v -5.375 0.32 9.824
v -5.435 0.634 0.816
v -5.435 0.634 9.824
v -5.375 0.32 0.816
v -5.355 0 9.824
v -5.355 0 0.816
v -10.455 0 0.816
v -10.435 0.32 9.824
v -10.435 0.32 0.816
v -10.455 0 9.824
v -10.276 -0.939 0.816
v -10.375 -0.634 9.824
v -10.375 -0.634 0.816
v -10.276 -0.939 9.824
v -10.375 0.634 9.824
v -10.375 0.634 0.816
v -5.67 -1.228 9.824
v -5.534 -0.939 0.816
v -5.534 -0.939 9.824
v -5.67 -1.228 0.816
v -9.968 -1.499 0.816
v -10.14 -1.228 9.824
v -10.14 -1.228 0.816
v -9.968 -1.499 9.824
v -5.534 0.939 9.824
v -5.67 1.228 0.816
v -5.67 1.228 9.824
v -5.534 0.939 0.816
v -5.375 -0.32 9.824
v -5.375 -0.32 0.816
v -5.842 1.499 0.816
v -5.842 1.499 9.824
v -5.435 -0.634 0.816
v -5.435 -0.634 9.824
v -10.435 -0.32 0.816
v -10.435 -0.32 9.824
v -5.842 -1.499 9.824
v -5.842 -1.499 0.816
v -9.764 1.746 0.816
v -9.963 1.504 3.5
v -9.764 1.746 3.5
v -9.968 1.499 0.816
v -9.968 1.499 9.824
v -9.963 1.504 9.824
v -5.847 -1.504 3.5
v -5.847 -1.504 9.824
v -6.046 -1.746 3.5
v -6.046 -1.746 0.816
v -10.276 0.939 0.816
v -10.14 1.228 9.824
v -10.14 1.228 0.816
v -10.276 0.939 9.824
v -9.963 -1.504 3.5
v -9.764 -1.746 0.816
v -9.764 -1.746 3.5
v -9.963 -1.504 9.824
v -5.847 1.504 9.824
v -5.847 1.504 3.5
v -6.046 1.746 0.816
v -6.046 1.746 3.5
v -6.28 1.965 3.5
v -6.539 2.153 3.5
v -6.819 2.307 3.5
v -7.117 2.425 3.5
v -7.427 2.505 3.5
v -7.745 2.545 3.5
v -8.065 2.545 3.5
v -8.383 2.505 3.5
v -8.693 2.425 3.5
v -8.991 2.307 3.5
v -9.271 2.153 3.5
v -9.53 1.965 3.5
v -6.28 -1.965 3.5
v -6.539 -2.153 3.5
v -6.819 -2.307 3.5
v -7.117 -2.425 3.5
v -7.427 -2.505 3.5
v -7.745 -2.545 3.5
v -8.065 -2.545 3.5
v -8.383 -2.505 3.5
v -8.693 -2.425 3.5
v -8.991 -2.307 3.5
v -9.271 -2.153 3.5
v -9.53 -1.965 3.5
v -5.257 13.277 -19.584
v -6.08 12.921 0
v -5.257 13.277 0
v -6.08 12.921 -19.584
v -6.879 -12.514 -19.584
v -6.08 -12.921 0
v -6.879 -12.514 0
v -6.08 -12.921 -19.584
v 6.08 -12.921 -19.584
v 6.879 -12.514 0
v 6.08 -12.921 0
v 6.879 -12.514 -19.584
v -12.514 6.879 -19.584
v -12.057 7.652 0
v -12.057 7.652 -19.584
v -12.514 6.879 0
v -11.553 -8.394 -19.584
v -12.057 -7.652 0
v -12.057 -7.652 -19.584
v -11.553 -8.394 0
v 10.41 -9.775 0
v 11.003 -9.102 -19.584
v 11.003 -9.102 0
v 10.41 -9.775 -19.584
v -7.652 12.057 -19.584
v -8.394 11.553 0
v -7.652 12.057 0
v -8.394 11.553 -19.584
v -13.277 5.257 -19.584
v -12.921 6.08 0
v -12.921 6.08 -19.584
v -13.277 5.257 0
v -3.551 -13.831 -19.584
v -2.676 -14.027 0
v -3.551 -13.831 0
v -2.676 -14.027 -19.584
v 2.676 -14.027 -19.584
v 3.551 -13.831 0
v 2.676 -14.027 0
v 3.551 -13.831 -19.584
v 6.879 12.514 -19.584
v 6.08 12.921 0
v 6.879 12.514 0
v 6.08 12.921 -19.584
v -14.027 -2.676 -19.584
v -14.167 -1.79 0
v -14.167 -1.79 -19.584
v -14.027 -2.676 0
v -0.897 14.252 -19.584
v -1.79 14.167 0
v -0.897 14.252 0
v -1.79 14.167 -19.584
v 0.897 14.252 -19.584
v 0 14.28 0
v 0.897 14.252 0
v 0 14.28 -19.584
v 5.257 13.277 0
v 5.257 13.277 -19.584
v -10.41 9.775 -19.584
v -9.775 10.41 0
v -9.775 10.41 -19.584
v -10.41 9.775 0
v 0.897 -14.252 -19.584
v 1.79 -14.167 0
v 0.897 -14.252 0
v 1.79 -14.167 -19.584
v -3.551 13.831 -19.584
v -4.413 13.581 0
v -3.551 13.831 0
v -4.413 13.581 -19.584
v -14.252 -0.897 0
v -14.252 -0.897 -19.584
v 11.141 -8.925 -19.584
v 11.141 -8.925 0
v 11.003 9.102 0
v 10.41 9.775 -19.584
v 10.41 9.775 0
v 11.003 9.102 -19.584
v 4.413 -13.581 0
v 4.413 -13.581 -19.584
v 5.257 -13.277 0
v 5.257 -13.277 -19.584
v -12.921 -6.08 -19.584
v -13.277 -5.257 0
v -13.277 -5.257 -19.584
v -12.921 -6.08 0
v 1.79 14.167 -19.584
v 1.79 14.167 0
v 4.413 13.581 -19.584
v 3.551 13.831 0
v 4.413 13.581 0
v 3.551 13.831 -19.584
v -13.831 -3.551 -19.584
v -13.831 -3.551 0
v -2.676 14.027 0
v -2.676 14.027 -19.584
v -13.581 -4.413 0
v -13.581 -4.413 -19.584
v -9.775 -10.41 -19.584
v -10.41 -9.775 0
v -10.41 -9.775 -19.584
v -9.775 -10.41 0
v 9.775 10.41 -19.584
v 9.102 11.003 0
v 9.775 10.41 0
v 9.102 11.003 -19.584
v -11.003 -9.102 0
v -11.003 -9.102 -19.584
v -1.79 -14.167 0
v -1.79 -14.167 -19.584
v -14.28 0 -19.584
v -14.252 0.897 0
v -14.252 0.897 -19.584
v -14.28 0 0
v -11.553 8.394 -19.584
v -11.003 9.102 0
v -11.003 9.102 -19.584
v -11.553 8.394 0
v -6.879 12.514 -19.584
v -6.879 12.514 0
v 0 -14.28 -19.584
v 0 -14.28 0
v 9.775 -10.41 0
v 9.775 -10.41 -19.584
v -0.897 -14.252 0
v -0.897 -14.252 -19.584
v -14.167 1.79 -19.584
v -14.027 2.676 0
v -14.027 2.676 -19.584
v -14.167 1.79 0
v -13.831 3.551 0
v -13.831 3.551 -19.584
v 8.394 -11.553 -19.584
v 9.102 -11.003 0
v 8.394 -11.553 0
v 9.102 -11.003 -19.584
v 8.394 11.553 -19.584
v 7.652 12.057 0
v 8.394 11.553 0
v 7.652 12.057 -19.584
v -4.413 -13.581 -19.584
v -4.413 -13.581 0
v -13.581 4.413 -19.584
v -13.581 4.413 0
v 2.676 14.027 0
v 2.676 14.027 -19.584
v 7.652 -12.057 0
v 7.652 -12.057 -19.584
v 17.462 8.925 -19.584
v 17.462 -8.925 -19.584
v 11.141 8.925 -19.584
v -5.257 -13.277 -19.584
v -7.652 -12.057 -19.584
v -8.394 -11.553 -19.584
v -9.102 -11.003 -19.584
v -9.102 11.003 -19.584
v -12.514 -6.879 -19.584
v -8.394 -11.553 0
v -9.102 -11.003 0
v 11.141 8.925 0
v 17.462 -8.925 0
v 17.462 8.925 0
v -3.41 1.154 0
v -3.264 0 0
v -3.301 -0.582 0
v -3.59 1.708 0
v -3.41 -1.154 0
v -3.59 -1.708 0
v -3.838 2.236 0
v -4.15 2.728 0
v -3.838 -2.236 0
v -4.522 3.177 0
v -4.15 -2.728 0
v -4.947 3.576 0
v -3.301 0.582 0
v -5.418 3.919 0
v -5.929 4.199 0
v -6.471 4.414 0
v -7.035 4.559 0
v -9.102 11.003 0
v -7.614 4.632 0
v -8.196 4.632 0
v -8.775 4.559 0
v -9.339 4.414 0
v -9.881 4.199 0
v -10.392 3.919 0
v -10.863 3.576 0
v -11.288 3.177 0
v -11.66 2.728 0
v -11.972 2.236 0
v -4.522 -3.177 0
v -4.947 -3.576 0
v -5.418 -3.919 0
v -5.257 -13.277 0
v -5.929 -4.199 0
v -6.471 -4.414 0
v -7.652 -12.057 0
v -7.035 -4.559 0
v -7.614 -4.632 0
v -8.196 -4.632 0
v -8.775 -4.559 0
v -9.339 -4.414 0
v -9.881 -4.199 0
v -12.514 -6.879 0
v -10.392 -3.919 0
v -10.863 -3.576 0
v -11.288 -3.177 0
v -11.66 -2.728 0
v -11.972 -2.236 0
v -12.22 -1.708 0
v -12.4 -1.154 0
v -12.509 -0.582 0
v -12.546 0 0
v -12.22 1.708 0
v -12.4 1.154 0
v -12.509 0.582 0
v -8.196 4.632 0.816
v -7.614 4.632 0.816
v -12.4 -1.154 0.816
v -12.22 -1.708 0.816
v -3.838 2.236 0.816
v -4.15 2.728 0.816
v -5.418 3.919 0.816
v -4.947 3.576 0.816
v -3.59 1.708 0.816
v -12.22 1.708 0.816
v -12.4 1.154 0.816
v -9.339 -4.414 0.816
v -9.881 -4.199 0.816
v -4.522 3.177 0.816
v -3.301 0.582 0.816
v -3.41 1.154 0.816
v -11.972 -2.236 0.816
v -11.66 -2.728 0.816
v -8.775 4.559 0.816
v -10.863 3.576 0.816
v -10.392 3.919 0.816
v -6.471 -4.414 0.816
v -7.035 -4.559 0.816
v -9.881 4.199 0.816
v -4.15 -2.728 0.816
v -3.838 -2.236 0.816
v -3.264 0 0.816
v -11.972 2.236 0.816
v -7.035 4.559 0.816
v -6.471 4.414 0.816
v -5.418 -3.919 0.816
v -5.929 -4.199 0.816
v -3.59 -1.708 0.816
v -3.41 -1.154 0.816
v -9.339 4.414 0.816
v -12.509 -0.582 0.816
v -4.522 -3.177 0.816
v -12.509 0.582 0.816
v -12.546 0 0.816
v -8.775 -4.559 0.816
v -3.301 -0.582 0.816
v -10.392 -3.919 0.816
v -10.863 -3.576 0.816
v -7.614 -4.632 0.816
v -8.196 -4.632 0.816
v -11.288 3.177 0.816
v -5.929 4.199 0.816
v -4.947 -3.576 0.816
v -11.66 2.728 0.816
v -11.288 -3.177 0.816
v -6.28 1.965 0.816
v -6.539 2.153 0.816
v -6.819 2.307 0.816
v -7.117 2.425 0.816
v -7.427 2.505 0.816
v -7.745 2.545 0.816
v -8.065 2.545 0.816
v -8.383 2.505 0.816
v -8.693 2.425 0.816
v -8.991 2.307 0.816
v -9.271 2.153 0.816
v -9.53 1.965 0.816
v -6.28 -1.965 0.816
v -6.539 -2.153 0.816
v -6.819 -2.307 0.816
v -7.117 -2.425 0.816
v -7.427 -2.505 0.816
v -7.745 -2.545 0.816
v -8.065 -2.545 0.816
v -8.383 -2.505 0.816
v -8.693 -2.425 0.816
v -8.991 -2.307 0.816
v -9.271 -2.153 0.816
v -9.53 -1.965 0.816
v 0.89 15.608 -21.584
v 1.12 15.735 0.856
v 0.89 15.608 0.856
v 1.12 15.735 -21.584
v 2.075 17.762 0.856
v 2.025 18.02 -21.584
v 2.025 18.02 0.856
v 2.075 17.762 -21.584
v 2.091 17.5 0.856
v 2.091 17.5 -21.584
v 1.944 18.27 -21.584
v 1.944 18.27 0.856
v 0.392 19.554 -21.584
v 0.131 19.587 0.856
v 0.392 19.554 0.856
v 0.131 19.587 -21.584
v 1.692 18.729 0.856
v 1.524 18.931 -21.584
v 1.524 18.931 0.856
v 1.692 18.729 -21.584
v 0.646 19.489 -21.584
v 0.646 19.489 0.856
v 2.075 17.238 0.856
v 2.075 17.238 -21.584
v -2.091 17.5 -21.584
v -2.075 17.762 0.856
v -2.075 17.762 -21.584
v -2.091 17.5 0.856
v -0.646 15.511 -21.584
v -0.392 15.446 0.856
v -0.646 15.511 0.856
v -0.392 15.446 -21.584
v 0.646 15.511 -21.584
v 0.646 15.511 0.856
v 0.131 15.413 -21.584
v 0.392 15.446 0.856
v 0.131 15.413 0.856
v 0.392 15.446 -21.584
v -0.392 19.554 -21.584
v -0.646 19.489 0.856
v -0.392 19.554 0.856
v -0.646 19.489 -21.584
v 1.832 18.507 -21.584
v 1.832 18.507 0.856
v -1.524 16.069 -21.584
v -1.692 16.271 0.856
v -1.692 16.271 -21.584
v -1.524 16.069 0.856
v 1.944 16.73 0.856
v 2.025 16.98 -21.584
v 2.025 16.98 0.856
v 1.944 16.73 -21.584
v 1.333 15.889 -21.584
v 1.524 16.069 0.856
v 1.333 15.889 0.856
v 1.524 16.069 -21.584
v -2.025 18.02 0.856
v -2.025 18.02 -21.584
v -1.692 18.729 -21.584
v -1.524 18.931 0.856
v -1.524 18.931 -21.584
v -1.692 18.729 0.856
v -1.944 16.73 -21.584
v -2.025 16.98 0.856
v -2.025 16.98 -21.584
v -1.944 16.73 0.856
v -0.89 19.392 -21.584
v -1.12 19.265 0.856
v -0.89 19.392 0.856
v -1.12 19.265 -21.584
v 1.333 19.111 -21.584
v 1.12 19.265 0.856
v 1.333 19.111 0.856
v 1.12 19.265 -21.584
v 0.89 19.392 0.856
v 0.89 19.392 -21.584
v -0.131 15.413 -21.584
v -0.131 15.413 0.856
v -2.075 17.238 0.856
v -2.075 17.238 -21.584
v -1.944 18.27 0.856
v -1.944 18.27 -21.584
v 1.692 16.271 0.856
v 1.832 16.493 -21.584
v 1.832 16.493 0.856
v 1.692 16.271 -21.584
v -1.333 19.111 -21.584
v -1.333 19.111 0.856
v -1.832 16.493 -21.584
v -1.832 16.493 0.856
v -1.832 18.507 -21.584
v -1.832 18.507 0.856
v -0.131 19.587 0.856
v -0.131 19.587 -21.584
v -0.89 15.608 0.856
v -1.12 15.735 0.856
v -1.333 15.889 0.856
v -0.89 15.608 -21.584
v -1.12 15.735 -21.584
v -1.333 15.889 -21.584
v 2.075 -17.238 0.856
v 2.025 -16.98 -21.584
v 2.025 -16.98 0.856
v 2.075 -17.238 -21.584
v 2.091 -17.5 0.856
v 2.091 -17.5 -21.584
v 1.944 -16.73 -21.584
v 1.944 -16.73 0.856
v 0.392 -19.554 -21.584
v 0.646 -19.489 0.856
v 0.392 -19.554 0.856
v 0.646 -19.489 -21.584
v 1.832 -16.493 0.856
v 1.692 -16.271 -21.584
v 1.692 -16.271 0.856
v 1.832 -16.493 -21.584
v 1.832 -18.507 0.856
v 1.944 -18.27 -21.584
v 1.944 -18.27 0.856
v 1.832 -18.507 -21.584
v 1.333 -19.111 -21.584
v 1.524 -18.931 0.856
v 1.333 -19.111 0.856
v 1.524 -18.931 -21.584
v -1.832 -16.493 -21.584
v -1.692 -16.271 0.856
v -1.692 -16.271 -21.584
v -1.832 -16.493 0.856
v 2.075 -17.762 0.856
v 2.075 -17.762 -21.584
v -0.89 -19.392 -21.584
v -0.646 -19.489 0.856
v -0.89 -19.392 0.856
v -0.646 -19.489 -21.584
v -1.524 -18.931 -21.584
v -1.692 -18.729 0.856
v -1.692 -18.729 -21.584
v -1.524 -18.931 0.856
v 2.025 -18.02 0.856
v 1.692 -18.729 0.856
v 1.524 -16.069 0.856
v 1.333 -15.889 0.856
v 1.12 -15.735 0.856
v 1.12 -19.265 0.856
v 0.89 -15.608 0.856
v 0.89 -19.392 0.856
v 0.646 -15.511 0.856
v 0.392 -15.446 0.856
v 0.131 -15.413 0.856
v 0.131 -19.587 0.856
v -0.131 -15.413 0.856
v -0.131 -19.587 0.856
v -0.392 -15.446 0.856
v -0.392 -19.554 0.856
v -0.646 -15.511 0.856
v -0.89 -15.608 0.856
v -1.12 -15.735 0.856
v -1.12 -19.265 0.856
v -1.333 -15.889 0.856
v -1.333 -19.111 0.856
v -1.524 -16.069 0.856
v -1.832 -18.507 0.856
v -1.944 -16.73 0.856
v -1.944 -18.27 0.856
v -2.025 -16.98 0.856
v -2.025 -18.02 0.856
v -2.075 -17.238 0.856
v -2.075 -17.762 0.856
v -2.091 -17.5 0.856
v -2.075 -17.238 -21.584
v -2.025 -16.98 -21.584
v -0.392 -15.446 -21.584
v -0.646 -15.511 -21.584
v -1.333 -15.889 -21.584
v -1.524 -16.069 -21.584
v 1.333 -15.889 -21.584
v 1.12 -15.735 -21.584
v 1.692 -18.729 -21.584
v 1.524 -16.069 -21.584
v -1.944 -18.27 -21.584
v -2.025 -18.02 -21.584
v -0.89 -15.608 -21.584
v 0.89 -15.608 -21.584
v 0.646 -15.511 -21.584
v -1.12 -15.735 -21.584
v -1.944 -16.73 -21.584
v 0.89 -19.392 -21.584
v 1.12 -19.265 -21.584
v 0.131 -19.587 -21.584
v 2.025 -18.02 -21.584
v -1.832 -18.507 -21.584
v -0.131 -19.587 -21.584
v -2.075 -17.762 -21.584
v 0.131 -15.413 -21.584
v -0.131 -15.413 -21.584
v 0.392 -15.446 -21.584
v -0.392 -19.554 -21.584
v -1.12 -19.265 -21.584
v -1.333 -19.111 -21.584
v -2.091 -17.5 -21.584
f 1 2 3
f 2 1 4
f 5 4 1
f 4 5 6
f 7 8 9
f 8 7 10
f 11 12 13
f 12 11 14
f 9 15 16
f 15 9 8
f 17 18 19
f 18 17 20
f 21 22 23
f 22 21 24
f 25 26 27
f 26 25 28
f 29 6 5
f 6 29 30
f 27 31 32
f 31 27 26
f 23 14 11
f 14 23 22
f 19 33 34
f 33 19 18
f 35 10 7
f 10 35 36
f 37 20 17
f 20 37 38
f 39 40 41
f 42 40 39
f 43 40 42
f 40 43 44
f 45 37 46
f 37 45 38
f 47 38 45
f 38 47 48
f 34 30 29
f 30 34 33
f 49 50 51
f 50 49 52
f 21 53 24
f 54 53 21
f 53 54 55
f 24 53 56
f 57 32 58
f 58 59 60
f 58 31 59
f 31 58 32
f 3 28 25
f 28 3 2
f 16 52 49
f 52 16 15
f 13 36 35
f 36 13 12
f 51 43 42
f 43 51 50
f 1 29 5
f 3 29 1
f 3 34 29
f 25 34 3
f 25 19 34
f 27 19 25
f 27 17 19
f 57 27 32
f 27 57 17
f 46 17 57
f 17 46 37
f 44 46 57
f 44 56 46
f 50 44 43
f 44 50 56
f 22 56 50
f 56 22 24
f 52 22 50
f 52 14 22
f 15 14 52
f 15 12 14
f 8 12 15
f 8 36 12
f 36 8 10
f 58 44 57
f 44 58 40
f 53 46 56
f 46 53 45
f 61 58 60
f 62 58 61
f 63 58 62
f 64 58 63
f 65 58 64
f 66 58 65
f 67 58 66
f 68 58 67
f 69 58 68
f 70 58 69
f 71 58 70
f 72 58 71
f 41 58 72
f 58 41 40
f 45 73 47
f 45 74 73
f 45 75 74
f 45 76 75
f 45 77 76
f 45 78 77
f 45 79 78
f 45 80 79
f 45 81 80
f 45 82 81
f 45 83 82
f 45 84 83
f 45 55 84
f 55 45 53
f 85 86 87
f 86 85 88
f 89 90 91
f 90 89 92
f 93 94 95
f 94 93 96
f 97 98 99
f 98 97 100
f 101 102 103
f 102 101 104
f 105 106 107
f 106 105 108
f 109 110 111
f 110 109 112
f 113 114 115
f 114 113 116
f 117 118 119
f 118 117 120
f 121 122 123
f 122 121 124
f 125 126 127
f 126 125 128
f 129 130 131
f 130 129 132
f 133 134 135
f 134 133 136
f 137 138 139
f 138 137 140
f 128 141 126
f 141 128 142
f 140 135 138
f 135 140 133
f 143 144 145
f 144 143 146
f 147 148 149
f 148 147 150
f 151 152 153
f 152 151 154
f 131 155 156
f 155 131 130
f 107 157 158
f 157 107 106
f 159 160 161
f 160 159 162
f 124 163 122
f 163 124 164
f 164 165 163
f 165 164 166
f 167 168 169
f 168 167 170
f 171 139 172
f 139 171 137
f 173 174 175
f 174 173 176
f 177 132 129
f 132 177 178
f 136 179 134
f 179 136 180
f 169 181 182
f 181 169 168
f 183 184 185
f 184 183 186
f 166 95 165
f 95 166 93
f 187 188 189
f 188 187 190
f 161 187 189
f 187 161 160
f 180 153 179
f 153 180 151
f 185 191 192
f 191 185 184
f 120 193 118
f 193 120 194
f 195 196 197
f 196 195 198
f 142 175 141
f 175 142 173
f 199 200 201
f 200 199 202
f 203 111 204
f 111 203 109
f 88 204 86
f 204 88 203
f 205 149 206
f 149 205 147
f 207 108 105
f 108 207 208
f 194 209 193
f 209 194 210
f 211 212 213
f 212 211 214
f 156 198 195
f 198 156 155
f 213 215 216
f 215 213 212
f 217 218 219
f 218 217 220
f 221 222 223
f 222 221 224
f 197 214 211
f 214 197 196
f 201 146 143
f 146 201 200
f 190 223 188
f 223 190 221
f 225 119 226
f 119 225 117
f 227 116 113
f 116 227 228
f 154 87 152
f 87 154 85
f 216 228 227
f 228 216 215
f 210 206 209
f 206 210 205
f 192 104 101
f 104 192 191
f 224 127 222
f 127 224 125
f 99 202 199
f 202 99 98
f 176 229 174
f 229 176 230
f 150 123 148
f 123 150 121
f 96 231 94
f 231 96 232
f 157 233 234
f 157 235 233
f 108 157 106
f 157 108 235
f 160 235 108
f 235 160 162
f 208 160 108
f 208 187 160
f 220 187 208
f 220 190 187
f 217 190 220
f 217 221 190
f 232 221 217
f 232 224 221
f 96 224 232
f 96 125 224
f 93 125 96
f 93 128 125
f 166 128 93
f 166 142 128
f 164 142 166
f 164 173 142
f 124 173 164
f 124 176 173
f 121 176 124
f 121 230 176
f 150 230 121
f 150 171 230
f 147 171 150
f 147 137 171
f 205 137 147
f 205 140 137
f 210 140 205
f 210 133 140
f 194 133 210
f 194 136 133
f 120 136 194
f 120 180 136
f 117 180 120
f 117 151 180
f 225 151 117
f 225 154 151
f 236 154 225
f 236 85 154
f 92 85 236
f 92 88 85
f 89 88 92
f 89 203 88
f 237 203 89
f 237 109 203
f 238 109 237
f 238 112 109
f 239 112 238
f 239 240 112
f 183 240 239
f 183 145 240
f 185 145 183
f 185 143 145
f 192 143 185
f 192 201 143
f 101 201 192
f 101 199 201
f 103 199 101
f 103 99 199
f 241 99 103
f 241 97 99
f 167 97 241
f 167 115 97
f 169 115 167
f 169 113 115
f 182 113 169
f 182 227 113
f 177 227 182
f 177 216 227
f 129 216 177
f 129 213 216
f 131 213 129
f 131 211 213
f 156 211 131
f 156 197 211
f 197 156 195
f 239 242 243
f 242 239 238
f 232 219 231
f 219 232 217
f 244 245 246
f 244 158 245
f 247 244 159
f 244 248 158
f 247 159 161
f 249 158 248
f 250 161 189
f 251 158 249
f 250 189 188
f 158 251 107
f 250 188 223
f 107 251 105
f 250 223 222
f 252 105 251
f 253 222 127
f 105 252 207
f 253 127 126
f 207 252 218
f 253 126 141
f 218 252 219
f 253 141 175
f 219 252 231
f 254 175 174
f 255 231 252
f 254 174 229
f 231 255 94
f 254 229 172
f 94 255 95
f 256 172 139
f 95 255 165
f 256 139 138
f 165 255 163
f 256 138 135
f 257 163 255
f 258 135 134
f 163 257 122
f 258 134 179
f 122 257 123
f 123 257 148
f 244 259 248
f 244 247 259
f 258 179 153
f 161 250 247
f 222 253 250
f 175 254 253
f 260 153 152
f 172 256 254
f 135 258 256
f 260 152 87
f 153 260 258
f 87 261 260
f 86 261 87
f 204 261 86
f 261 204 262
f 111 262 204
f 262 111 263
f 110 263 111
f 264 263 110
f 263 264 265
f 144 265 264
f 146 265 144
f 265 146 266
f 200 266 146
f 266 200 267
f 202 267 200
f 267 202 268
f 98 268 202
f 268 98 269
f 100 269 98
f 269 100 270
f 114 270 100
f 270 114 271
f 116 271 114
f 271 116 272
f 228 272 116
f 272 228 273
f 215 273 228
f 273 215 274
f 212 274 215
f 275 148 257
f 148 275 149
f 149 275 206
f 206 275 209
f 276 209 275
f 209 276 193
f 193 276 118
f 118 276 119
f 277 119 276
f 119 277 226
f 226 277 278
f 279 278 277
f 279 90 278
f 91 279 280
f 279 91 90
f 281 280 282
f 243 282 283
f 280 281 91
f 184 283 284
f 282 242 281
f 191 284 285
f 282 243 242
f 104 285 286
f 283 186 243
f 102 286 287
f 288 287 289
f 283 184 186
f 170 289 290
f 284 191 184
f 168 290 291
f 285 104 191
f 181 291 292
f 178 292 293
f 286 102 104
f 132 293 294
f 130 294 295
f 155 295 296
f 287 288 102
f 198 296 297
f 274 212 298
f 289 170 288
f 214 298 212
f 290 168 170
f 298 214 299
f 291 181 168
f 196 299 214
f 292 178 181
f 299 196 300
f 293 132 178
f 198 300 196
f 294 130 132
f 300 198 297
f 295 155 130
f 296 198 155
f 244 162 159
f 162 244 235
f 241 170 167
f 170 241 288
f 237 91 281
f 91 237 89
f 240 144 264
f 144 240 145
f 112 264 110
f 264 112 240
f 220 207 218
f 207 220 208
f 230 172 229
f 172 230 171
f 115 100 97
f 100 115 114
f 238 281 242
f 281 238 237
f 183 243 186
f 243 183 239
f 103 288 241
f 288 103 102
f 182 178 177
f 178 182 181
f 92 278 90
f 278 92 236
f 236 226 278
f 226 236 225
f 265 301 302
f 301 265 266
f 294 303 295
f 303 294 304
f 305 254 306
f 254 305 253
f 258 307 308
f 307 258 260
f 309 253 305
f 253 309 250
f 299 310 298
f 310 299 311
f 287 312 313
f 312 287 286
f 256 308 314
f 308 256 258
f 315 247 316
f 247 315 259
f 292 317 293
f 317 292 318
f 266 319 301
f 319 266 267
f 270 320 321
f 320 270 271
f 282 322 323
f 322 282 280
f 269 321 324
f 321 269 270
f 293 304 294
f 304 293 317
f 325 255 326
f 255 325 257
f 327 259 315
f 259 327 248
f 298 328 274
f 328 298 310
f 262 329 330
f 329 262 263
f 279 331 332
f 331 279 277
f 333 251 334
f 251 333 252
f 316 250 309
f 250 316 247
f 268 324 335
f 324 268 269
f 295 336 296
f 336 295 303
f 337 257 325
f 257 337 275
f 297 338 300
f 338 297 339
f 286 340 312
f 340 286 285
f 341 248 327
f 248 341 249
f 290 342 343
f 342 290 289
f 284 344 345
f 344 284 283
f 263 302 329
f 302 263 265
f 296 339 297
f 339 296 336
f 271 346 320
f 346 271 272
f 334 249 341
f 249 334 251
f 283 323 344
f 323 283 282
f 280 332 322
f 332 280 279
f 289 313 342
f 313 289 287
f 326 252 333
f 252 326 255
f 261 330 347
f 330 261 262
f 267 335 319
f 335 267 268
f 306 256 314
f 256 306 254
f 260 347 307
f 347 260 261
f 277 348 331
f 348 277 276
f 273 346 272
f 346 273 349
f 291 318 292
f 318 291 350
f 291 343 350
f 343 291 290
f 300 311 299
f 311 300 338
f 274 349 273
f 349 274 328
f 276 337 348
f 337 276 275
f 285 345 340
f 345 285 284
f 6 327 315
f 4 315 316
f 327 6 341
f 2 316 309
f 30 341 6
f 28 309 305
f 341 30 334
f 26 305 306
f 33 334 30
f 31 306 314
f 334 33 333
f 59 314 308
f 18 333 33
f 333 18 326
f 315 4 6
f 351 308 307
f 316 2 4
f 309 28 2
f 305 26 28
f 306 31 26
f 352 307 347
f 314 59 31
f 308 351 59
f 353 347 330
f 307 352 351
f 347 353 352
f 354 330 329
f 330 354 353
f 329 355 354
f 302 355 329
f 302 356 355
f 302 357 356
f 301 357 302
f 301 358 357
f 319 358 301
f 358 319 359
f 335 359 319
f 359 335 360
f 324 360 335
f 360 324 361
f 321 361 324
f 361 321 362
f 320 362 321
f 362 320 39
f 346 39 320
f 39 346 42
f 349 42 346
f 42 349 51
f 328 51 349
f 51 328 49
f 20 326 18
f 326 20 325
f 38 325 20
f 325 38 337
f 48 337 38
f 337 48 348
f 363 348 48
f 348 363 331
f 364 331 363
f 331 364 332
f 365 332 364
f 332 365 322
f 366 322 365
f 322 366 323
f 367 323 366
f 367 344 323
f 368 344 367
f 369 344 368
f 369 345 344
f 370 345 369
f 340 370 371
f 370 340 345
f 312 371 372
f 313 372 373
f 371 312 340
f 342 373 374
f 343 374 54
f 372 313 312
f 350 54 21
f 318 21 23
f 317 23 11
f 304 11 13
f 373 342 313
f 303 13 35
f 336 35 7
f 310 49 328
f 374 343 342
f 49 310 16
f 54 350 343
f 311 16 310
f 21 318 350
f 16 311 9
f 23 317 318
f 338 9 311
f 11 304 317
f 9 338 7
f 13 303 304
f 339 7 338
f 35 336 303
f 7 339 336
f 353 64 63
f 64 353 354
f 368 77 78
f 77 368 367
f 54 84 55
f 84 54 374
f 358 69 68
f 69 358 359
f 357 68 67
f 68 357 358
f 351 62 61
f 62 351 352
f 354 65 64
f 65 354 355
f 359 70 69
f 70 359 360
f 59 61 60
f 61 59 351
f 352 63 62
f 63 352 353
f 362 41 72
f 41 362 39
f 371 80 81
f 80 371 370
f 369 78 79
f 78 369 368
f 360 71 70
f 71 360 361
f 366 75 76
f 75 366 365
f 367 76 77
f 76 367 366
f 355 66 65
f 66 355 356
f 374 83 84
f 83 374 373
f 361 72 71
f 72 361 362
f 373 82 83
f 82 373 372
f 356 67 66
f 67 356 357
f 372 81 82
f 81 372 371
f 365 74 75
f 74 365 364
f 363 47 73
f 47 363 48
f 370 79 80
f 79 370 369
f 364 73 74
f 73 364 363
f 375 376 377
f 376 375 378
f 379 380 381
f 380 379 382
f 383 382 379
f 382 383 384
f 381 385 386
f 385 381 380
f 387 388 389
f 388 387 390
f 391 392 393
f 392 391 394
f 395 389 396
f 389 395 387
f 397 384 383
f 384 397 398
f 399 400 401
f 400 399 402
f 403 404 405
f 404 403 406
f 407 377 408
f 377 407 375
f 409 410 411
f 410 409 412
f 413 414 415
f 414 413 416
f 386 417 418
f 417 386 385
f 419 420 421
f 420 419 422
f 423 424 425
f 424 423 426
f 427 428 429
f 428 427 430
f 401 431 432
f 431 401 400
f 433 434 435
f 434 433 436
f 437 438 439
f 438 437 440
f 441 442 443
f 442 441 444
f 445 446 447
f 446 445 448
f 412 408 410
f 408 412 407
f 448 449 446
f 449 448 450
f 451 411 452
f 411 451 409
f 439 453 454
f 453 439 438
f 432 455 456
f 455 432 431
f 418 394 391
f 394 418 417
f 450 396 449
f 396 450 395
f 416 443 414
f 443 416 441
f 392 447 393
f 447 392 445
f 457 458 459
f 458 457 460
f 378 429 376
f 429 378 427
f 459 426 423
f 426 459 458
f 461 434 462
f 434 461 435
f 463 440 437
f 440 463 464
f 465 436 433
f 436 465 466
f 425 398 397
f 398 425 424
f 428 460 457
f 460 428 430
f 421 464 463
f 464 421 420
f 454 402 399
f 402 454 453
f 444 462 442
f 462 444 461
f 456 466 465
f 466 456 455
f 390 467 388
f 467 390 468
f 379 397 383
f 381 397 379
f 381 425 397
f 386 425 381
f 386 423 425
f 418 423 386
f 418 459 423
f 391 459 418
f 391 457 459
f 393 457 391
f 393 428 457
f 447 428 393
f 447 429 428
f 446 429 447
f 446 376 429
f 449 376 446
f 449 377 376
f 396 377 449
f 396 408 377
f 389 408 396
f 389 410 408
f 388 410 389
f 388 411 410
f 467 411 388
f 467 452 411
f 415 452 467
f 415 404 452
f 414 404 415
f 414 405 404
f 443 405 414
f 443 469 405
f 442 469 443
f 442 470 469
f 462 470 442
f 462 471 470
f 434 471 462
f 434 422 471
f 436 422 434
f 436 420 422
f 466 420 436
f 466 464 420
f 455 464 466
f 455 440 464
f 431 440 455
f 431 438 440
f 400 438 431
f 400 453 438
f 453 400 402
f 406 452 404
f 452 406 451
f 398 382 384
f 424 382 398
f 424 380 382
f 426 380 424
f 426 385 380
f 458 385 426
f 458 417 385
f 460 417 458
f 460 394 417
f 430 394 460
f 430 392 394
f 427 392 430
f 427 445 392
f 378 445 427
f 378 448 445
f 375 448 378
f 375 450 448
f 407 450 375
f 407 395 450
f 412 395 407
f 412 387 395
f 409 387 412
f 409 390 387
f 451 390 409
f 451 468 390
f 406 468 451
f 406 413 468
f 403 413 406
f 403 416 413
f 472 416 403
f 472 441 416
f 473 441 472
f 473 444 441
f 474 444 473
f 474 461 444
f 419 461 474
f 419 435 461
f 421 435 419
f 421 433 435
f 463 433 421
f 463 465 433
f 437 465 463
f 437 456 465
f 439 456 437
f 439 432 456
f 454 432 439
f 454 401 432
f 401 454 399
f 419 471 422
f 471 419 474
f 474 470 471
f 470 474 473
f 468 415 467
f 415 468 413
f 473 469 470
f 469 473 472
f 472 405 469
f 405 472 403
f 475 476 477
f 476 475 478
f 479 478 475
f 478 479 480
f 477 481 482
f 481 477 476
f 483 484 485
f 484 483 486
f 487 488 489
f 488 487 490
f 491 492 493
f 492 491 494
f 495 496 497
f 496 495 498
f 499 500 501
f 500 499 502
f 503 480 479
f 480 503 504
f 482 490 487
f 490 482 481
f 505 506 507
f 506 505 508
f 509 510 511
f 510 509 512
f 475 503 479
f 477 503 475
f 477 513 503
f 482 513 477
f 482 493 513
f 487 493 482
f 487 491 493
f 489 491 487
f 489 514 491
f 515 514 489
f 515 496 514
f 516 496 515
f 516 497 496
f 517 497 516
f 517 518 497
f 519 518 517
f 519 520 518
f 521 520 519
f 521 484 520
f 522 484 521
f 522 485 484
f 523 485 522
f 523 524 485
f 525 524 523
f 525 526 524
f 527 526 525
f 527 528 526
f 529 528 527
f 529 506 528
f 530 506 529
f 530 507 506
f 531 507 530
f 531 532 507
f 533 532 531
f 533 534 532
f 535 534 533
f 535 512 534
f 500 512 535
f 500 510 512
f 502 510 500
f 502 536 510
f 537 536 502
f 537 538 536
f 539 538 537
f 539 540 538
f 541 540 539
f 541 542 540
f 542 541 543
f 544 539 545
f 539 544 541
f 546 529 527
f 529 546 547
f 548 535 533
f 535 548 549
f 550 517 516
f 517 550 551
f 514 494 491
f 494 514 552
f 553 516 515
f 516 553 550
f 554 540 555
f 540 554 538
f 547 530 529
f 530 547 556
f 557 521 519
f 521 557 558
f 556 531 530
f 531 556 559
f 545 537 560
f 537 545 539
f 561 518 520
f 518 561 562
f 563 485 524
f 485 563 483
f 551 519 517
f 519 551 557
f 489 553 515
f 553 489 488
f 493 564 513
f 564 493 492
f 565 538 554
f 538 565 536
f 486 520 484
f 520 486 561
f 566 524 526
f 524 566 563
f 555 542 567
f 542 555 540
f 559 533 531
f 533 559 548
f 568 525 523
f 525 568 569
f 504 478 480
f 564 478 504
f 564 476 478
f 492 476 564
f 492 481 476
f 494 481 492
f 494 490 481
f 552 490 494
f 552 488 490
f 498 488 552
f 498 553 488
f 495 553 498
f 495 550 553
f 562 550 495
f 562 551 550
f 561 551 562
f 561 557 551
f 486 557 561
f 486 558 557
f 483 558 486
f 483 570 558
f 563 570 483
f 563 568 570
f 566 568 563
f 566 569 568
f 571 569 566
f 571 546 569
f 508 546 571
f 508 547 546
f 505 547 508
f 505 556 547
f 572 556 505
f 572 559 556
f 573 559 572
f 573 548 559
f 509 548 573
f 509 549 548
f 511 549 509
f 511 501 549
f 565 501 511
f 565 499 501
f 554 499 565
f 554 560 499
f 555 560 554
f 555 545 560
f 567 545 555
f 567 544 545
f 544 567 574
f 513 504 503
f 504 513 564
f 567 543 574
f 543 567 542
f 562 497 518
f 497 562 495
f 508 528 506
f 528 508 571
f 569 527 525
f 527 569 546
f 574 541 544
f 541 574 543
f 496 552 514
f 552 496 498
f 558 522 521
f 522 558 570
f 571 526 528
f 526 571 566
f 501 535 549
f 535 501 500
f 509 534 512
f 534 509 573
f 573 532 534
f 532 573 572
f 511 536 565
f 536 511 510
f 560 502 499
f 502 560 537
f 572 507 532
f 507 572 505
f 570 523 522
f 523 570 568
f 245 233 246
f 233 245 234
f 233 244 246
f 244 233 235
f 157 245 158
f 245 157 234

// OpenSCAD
module Stepper5VGear (margin, axisrotation) 
{
    faktor = margin == true ? 1.02 : 1;
    
    // stepper motor body
    bodyHeight = 19.2 * faktor;
    bodyRadius = 14 * faktor;
    translate([0,0,-bodyHeight]) cylinder(h=bodyHeight, r=bodyRadius,  $fn=100, center=false);   
    
    // static tower
    staticTowerRadius = 4.55* faktor;
    staticTowerMargin= 1.7* faktor;
    translate([-bodyRadius+staticTowerRadius+staticTowerMargin,0,0]) cylinder(h=1.6* faktor, r=staticTowerRadius, $fn=50, center=true); 
    
    // axis
    
        axisRadius = 2.5* faktor;
        translate([-bodyRadius+staticTowerRadius+staticTowerMargin,0,0]) cylinder(h=7, r=axisRadius, $fn=50, center=true); 
        
        intersection() 
        {
            cubeHeight = 6.2* faktor;
            translate([-bodyRadius+staticTowerRadius+staticTowerMargin,0,0]) cylinder(h=30* faktor, r=axisRadius, $fn=50, center=true); 
            translate([-bodyRadius+staticTowerRadius+staticTowerMargin,0,3.5 + cubeHeight/2]) rotate([0,0,axisrotation]) cube([2.95* faktor,5* faktor,6.2* faktor],center=true);
        }

    
    // holder
    translate([0,35/2,-bodyHeight-2]) cylinder(h=22* faktor, r=2.05* faktor,  $fn=50, center=false);   
    translate([0,-35/2,-bodyHeight-2]) cylinder(h=22* faktor, r=2.05* faktor,  $fn=50, center=false);   
    
    // cable holder
    translate([bodyRadius,0,-bodyHeight/2]) cube([6.24* faktor,17.5* faktor,bodyHeight],center=true);
    
    // Print-Dummy-Base
    //baseHeight = 3;
    //translate([0,0,-bodyHeight+baseHeight/2])  cube([10,42,baseHeight],center=true);
}



//color([1,0,1]) Stepper5VGear(false);
Stepper5VGear(true,90);
